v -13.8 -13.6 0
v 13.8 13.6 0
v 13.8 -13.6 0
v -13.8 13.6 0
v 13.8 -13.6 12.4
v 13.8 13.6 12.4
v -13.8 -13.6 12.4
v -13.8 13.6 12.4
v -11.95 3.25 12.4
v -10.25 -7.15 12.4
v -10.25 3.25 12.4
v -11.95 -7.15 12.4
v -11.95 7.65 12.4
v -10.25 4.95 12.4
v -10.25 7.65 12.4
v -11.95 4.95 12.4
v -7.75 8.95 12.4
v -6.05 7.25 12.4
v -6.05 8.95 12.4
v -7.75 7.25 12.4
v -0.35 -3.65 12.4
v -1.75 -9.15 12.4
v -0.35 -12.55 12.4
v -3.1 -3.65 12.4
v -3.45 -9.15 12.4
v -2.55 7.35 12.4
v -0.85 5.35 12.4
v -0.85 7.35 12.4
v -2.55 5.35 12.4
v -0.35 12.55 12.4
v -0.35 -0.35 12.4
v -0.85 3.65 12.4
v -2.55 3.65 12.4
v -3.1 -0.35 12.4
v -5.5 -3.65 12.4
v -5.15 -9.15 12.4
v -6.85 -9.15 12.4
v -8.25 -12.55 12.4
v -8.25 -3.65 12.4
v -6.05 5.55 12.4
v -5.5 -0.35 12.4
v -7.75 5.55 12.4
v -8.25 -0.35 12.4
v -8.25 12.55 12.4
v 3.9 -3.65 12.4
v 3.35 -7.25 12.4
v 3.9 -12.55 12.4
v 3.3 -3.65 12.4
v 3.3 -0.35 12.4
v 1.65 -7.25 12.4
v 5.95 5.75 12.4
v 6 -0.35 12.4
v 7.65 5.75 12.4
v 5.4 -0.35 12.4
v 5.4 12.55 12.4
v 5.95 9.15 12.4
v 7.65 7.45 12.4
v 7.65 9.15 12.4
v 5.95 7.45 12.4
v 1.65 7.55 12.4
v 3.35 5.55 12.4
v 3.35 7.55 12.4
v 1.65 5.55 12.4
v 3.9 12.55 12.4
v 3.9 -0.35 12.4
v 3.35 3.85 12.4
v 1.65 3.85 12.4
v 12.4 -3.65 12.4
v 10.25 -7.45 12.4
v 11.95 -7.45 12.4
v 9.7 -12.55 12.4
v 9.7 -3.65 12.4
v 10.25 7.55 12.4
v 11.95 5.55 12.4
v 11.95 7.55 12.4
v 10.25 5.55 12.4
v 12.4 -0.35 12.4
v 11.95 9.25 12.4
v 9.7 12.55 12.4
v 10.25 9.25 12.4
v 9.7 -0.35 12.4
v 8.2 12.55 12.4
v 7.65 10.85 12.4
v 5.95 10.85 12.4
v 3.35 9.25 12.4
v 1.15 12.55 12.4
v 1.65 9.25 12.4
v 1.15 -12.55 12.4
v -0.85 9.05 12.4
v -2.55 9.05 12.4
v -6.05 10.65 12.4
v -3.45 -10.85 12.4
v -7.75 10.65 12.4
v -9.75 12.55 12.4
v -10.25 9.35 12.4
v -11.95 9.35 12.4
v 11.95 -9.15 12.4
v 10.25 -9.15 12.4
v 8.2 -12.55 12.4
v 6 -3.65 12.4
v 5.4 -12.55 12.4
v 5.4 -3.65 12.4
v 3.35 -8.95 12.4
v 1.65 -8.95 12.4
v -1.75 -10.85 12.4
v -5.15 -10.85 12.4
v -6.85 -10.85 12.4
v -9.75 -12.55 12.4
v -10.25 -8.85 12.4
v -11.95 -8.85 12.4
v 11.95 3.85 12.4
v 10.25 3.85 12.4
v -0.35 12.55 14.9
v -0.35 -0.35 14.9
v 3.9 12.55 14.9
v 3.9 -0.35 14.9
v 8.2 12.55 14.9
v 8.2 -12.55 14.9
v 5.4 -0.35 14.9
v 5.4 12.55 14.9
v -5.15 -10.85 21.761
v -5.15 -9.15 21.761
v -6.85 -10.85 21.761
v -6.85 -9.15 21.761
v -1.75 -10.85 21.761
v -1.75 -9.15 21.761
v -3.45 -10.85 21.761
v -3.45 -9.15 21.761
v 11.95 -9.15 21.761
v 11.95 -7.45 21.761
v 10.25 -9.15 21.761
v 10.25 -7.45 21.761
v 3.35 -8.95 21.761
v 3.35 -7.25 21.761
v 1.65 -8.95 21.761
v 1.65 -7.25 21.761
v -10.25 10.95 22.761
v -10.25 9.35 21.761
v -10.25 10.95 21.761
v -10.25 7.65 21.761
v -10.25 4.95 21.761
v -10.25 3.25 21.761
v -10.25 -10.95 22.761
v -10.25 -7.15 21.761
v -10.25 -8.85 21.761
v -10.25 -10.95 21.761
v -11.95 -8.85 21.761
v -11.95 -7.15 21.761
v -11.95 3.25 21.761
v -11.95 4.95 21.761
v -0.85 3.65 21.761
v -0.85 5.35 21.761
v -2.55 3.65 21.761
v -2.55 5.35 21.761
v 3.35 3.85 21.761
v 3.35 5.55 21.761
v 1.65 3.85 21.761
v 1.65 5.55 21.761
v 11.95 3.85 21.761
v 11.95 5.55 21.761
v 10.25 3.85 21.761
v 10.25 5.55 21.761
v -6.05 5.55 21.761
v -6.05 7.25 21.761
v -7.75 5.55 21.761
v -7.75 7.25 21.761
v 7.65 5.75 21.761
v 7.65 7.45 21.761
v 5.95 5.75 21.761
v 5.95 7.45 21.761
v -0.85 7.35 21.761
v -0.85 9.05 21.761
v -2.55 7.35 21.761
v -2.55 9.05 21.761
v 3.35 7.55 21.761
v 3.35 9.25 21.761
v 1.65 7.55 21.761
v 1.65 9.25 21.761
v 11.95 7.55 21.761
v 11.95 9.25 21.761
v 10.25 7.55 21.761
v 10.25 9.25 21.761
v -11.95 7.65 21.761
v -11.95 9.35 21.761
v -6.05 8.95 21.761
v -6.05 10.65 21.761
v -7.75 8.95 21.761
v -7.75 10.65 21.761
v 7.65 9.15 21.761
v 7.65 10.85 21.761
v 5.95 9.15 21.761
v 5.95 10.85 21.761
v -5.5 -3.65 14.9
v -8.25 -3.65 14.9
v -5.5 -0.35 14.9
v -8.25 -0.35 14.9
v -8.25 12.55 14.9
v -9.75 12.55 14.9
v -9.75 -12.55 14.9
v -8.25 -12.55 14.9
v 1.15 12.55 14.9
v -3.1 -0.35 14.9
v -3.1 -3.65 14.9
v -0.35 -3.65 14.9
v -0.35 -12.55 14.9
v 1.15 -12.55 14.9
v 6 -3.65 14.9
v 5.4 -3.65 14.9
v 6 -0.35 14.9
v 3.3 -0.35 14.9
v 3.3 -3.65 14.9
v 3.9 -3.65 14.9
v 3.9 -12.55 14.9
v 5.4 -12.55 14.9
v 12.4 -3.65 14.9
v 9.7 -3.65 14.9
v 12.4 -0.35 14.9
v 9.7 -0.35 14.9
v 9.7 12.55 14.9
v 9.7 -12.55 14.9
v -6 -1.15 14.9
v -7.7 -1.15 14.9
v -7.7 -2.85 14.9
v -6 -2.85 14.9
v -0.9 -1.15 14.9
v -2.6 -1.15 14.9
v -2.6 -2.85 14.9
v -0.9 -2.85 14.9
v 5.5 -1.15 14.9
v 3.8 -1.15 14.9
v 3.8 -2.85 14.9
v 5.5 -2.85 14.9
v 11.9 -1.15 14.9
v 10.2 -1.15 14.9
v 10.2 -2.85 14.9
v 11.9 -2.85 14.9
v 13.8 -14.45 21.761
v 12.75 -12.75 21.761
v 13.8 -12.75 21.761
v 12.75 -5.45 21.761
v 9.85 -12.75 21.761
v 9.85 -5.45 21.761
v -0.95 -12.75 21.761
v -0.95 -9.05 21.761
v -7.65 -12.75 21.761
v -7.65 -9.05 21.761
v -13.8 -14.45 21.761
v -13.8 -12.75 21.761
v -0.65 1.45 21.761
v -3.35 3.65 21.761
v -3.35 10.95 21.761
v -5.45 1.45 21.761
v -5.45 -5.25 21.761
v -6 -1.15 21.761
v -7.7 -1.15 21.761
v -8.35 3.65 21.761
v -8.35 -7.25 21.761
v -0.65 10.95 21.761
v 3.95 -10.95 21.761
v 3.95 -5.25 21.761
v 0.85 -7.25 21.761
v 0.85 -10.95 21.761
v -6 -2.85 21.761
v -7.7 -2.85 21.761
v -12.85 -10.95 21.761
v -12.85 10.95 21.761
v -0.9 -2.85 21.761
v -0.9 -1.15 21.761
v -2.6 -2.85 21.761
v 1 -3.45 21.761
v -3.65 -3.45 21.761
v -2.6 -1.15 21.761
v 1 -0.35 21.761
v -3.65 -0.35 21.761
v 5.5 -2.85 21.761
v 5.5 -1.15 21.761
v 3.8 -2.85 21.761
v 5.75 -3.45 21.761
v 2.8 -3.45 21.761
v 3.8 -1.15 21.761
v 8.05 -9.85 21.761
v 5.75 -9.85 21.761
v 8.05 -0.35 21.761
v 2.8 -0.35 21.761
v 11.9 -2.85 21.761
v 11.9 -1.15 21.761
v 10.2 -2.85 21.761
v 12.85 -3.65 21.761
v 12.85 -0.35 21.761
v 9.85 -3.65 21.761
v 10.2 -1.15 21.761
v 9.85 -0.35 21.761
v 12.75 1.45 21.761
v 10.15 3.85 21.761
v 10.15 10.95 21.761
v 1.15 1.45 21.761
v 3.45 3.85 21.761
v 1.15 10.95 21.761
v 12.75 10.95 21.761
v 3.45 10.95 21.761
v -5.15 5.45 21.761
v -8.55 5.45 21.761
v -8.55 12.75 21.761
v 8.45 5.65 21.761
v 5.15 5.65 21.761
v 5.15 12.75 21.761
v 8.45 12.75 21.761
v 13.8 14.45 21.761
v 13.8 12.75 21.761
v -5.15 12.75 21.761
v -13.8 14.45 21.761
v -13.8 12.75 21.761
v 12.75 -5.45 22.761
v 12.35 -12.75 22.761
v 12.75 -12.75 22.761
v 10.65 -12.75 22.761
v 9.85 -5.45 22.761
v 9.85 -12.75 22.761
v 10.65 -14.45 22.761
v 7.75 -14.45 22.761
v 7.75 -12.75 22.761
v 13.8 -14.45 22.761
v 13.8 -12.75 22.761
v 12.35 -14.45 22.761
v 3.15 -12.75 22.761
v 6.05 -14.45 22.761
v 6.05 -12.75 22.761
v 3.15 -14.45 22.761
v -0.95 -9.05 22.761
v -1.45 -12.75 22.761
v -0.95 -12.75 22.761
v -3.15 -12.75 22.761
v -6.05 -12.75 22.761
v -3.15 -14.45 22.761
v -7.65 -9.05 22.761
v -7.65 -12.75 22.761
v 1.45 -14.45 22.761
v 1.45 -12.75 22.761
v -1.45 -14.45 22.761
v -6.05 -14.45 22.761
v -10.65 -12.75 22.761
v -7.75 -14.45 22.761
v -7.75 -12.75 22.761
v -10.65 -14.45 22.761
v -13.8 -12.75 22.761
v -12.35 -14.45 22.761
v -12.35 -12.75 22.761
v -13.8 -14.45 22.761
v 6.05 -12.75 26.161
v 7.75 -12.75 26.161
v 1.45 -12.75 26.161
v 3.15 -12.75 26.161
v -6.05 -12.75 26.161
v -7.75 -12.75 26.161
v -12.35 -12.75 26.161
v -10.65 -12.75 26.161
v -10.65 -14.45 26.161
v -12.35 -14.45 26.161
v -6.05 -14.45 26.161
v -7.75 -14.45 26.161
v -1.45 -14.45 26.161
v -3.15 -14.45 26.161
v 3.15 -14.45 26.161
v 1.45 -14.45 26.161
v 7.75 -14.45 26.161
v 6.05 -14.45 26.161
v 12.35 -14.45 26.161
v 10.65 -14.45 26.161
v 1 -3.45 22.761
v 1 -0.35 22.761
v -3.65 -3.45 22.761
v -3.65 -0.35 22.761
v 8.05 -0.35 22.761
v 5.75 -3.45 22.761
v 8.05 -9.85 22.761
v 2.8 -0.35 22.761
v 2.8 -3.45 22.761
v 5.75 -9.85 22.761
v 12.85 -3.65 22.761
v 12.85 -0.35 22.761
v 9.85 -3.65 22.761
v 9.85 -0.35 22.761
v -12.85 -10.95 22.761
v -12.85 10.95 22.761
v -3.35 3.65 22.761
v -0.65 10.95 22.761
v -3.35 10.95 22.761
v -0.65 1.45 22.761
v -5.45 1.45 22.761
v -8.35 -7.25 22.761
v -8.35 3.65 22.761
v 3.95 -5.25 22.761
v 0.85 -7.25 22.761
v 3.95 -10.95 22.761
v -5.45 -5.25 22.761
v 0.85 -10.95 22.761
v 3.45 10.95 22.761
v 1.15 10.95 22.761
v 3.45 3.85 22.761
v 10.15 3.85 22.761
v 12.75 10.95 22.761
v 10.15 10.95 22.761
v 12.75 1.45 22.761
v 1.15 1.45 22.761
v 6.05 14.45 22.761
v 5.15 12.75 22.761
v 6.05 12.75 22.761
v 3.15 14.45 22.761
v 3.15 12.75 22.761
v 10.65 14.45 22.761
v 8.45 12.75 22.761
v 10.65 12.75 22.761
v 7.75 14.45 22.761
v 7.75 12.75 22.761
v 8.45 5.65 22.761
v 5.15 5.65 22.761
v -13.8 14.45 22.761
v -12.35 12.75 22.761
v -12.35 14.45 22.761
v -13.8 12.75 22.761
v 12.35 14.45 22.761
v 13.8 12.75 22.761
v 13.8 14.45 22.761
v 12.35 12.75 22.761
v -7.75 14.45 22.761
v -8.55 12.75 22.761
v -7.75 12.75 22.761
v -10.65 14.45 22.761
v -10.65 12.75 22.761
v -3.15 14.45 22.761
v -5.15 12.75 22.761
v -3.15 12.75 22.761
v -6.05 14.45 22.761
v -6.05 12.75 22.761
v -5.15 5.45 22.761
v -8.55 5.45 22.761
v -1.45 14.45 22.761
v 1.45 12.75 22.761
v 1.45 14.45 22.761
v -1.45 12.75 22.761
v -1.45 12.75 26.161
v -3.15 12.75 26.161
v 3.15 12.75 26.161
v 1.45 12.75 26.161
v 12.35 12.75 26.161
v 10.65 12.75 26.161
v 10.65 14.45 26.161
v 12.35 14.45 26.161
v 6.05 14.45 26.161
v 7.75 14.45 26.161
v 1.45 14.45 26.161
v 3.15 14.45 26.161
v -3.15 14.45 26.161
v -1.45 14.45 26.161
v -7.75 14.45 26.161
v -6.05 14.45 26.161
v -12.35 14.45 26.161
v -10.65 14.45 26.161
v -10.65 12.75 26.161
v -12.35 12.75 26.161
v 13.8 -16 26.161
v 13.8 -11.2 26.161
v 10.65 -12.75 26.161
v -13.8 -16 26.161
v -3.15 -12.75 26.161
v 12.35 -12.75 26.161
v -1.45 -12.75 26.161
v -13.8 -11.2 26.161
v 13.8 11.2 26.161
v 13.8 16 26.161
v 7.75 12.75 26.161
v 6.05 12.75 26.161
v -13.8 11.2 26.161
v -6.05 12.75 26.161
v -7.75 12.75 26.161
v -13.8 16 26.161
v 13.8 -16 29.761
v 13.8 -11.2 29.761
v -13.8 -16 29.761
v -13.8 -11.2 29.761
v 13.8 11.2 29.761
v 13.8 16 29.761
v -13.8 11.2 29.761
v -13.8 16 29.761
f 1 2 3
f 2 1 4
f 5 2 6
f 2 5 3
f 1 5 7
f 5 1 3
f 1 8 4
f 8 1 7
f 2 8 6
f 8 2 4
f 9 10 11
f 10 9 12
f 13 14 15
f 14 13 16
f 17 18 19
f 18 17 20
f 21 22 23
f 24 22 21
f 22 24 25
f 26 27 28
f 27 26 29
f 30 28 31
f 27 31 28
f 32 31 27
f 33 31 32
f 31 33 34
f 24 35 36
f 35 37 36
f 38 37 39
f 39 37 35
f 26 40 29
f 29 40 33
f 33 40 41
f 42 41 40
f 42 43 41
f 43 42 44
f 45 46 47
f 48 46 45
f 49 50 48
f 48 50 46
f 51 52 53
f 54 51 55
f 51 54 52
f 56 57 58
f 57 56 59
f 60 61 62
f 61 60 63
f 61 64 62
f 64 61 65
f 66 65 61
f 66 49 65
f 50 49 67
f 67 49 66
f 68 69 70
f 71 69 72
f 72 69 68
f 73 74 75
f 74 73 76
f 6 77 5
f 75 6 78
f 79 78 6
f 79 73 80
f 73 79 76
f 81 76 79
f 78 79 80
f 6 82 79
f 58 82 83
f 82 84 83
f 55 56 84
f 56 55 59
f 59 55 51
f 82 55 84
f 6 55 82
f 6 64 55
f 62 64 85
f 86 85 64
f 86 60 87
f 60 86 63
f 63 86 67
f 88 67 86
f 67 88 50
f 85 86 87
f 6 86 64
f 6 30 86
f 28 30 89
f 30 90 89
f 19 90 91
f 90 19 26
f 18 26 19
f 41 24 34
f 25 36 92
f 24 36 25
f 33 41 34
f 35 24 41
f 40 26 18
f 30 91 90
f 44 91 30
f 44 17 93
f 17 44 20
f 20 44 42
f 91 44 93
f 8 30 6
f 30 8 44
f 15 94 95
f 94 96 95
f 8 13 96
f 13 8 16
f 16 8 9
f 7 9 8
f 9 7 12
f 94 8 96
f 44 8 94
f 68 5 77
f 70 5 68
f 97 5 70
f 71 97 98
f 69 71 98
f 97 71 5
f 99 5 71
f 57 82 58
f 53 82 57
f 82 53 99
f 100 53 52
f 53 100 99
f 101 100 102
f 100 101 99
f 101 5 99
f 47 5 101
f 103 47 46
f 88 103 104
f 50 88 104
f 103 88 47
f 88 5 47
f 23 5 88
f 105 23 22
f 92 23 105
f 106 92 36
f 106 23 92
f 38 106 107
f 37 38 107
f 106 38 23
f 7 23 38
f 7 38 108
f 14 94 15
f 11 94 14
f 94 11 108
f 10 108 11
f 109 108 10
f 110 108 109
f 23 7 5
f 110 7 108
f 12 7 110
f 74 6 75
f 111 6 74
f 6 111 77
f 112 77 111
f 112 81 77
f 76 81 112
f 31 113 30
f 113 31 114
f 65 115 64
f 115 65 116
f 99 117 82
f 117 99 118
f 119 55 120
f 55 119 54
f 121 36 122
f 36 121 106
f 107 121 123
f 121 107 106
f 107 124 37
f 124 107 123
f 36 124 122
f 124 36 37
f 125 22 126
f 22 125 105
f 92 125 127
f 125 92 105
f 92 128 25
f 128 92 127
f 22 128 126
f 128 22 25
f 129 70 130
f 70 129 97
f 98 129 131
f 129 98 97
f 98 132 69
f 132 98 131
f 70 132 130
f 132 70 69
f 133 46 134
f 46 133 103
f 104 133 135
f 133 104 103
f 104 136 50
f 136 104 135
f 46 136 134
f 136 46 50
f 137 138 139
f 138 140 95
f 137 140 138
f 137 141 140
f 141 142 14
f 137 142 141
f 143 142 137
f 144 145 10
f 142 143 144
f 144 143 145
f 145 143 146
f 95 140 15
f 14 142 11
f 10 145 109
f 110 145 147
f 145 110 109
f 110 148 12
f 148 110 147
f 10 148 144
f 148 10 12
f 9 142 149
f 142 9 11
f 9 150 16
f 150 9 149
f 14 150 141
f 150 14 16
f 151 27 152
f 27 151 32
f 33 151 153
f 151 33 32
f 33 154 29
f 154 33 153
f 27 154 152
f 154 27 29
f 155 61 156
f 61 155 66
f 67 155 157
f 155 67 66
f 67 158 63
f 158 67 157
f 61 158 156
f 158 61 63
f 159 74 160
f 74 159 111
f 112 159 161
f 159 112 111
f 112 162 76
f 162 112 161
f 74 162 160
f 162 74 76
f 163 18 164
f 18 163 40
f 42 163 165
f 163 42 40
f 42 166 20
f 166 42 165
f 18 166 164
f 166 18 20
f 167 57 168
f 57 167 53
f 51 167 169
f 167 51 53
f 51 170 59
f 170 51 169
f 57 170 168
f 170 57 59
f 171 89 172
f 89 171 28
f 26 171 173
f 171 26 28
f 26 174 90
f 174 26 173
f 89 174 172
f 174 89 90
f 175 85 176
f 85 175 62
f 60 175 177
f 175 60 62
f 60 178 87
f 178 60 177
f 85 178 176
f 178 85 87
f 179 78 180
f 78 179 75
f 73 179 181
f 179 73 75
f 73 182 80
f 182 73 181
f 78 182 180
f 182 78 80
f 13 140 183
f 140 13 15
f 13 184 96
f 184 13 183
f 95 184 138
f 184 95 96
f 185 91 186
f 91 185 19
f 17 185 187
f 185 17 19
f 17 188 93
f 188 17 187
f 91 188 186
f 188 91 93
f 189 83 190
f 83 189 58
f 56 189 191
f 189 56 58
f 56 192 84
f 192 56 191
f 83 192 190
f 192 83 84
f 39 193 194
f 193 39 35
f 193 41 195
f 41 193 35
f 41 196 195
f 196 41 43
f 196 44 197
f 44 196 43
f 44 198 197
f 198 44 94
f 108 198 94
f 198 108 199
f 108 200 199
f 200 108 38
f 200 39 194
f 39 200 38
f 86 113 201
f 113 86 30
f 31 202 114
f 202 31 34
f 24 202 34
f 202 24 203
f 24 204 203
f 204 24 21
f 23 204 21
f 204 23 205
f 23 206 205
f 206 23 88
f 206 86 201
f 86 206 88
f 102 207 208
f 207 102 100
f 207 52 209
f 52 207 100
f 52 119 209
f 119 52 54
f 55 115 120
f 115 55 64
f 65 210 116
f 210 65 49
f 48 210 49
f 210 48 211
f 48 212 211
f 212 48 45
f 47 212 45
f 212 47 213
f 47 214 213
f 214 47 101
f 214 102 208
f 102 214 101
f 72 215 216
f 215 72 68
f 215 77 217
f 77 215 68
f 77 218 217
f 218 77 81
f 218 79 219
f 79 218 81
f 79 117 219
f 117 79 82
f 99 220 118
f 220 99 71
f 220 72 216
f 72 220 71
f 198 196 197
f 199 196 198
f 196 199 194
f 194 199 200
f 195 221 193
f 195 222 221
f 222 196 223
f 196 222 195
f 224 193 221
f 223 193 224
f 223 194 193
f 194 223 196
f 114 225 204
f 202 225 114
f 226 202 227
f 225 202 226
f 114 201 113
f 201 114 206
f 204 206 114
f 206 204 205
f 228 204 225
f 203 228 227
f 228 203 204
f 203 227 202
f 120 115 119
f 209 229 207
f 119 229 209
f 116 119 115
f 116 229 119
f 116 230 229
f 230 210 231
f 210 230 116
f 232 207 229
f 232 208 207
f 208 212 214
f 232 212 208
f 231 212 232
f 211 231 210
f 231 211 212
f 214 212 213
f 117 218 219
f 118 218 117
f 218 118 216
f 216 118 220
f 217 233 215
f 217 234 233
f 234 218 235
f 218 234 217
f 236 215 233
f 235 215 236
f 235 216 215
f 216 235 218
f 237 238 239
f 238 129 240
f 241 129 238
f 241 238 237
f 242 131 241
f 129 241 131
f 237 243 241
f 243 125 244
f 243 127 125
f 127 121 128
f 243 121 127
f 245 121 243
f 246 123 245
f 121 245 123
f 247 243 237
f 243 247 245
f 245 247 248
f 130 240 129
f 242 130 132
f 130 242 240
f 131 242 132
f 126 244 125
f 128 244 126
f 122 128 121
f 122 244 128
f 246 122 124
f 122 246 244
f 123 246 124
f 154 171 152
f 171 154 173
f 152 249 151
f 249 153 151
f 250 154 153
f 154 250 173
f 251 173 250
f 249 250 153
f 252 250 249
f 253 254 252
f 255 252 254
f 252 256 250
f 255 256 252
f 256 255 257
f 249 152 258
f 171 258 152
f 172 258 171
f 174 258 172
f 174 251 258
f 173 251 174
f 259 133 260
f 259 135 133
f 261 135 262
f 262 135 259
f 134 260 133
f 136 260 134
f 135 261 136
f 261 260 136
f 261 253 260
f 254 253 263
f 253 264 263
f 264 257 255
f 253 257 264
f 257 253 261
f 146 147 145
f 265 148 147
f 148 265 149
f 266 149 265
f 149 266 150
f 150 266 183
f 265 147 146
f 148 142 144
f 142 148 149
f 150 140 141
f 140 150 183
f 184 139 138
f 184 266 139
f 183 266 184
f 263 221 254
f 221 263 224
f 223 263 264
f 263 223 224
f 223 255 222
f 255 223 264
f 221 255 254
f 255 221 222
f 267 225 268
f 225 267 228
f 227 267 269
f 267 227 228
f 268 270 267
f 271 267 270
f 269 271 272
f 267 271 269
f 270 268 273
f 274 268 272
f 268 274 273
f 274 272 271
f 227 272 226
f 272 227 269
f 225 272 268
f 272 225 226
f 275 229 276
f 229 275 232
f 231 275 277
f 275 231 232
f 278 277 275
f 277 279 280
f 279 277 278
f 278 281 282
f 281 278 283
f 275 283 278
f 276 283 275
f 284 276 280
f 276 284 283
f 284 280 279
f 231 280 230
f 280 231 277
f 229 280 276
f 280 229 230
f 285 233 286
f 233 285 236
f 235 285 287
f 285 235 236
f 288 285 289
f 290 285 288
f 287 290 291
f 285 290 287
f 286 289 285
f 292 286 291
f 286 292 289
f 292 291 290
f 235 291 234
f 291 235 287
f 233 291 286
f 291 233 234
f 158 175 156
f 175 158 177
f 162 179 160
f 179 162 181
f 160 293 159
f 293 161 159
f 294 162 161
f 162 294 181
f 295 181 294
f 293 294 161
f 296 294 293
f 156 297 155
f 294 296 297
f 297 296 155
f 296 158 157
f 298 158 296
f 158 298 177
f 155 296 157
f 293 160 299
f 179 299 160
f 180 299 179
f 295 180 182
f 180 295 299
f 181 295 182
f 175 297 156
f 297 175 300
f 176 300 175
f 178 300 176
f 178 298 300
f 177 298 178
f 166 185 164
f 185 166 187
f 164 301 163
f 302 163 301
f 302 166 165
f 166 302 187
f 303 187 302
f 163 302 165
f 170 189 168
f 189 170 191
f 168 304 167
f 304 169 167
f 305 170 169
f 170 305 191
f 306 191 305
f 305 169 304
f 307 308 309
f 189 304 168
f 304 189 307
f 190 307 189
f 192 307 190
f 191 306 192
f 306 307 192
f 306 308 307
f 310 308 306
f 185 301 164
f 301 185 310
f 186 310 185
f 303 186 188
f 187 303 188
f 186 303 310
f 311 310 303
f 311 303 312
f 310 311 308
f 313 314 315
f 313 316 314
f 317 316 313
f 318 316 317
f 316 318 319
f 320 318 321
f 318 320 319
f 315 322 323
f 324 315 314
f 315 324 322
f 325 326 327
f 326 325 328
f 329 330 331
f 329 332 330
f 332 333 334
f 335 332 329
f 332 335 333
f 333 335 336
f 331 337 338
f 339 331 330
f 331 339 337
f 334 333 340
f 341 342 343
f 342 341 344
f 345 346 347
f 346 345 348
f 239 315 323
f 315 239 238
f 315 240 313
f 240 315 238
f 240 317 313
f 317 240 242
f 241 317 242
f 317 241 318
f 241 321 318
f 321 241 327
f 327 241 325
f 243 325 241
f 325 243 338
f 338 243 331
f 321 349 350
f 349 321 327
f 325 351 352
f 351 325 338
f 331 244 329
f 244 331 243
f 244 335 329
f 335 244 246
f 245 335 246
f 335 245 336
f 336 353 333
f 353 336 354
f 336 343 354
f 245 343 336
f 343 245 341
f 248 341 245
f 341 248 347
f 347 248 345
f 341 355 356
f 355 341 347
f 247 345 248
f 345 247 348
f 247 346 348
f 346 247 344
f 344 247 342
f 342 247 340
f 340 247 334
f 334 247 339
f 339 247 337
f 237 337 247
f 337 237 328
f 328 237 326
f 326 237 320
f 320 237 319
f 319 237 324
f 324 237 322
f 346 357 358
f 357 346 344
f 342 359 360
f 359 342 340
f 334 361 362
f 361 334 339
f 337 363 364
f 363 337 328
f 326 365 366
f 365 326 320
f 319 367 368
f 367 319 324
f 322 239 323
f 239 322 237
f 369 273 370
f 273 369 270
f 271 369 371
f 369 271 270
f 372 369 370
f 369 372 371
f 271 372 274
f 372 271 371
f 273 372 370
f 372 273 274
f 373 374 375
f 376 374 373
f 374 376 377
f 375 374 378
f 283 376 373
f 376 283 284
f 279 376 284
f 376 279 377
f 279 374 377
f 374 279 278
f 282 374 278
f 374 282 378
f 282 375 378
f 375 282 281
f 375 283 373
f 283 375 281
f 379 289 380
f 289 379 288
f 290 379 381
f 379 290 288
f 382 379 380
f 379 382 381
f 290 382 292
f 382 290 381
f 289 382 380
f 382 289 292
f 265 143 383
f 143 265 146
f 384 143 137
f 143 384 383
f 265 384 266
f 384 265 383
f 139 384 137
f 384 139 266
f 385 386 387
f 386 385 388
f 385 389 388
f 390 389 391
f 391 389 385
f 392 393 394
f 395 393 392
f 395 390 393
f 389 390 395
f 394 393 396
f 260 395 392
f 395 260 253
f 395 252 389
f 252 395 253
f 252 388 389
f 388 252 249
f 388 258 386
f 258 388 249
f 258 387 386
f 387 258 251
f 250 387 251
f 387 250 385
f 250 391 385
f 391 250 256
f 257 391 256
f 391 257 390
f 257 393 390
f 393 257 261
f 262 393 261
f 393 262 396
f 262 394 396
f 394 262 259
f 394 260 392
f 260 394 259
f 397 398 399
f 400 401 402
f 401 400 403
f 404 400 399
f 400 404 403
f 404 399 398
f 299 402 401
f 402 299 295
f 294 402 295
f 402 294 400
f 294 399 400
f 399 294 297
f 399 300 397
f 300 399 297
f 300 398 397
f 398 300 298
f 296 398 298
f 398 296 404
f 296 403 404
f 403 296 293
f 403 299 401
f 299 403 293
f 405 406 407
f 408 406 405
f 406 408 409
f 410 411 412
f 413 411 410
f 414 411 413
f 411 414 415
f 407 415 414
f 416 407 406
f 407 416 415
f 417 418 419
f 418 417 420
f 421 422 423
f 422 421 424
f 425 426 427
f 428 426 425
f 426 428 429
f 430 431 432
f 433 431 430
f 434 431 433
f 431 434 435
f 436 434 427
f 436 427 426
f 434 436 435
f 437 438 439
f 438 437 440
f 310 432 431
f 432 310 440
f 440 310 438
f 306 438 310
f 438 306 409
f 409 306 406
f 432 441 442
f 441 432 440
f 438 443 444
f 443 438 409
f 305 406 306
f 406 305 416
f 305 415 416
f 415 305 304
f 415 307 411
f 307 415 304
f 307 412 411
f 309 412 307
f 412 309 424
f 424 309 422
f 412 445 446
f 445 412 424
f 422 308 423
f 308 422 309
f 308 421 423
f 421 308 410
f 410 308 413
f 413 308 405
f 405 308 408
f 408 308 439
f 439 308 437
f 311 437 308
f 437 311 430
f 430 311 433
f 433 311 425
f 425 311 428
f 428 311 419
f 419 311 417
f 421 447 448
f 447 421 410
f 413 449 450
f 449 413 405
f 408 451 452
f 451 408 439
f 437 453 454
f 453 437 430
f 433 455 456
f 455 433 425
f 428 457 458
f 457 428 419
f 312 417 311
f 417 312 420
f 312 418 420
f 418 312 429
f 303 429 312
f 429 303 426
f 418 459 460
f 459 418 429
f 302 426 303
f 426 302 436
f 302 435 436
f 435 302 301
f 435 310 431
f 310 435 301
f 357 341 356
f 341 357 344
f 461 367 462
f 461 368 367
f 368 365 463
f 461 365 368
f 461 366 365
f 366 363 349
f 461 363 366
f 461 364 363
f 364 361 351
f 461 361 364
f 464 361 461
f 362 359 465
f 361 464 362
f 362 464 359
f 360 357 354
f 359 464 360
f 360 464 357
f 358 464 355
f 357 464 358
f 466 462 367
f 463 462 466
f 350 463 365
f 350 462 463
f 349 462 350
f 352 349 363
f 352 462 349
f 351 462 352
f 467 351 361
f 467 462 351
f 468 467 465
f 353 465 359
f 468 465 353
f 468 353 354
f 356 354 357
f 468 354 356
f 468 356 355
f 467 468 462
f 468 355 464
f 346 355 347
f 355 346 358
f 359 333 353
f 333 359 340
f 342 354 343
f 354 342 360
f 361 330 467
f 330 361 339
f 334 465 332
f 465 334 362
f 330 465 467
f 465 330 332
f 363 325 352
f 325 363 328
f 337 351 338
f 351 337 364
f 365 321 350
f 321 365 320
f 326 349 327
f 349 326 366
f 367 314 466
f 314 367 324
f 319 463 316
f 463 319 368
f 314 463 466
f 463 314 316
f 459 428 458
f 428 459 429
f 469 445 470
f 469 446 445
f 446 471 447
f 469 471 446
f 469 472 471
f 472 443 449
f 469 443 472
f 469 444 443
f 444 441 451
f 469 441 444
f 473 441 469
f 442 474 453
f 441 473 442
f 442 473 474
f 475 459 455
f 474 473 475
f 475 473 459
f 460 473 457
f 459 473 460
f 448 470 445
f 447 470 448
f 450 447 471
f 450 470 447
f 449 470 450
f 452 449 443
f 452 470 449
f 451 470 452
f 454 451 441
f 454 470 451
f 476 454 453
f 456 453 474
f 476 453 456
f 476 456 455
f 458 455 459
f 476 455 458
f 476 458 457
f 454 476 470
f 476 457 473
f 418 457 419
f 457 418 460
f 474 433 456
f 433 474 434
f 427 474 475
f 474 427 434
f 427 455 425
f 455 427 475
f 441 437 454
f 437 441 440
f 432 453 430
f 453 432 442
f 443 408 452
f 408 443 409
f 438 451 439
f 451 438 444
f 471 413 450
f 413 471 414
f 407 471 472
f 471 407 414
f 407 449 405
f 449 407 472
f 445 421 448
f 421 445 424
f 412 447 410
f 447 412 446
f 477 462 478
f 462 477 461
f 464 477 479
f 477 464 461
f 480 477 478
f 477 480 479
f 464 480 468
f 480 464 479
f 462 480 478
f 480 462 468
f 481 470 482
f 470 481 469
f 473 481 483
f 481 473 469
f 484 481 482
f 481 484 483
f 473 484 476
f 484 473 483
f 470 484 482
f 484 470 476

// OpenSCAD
// Generated by SolidPython 0.4.2 on 2020-09-29 23:19:44
//!OpenSCAD

scale(v = 0.0100000000) {
	translate(v = [-1380, -1360, 0]) {
		union() {
			color(c = [0.4000000000, 0.4000000000, 0.4000000000]) {
				translate(v = [0, 0, 0]) {
					linear_extrude(height = 1000.0000000000) {
						polygon(paths = [[0, 1, 2, 3]], points = [[0, 0], [0, 2720], [2760, 2720], [2760, 0]]);
					}
				}
			}
			color(c = [0.2000000000, 0.6000000000, 0.2000000000]) {
				translate(v = [0, 0, 1000.0000000000]) {
					linear_extrude(height = 120.0000000000) {
						polygon(paths = [[0, 1, 2, 3]], points = [[0, 1305], [0, 2720], [2760, 2720], [2760, 1305]]);
					}
				}
			}
			color(c = [0.4000000000, 0.4000000000, 0.4000000000]) {
				translate(v = [0, 0, 1000.0000000000]) {
					linear_extrude(height = 120.0000000000) {
						polygon(paths = [[0, 1, 2, 3]], points = [[0, 0], [0, 1305], [2760, 1305], [2760, 0]]);
					}
				}
			}
			color(c = [0.9000000000, 0.6000000000, 0.6000000000]) {
				translate(v = [0, 0, 1120.0000000000]) {
					linear_extrude(height = 120.0000000000) {
						polygon(paths = [[0, 1, 2, 3]], points = [[145, 1485], [145, 2485], [405, 2485], [405, 1485]]);
					}
				}
			}
			color(c = [0.9000000000, 0.6000000000, 0.6000000000]) {
				translate(v = [0, 0, 1120.0000000000]) {
					linear_extrude(height = 120.0000000000) {
						polygon(paths = [[0, 1, 2, 3]], points = [[555, 1485], [555, 2485], [815, 2485], [815, 1485]]);
					}
				}
			}
			color(c = [0.9000000000, 0.6000000000, 0.6000000000]) {
				translate(v = [0, 0, 1120.0000000000]) {
					linear_extrude(height = 120.0000000000) {
						polygon(paths = [[0, 1, 2, 3]], points = [[1085, 1485], [1085, 2485], [1345, 2485], [1345, 1485]]);
					}
				}
			}
			color(c = [0.9000000000, 0.6000000000, 0.6000000000]) {
				translate(v = [0, 0, 1120.0000000000]) {
					linear_extrude(height = 120.0000000000) {
						polygon(paths = [[0, 1, 2, 3]], points = [[1495, 1485], [1495, 2485], [1770, 2485], [1770, 1485]]);
					}
				}
			}
			color(c = [0.9000000000, 0.6000000000, 0.6000000000]) {
				translate(v = [0, 0, 1120.0000000000]) {
					linear_extrude(height = 120.0000000000) {
						polygon(paths = [[0, 1, 2, 3]], points = [[1920, 1485], [1920, 2485], [2200, 2485], [2200, 1485]]);
					}
				}
			}
			color(c = [0.9000000000, 0.6000000000, 0.6000000000]) {
				translate(v = [0, 0, 1120.0000000000]) {
					linear_extrude(height = 120.0000000000) {
						polygon(paths = [[0, 1, 2, 3]], points = [[2350, 1485], [2350, 2485], [2615, 2485], [2615, 1485]]);
					}
				}
			}
			color(c = [0.9000000000, 0.6000000000, 0.9000000000]) {
				translate(v = [0, 0, 1120.0000000000]) {
					linear_extrude(height = 120.0000000000) {
						polygon(paths = [[0, 1, 2, 3]], points = [[145, 235], [145, 885], [405, 885], [405, 235]]);
					}
				}
			}
			color(c = [0.9000000000, 0.6000000000, 0.9000000000]) {
				translate(v = [0, 0, 1120.0000000000]) {
					linear_extrude(height = 120.0000000000) {
						polygon(paths = [[0, 1, 2, 3]], points = [[555, 235], [555, 885], [1345, 885], [1345, 235]]);
					}
				}
			}
			color(c = [0.9000000000, 0.6000000000, 0.9000000000]) {
				translate(v = [0, 0, 1120.0000000000]) {
					linear_extrude(height = 120.0000000000) {
						polygon(paths = [[0, 1, 2, 3]], points = [[1495, 235], [1495, 885], [1770, 885], [1770, 235]]);
					}
				}
			}
			color(c = [0.9000000000, 0.6000000000, 0.9000000000]) {
				translate(v = [0, 0, 1120.0000000000]) {
					linear_extrude(height = 120.0000000000) {
						polygon(paths = [[0, 1, 2, 3]], points = [[1920, 235], [1920, 885], [2200, 885], [2200, 235]]);
					}
				}
			}
			color(c = [0.9000000000, 0.6000000000, 0.9000000000]) {
				translate(v = [0, 0, 1120.0000000000]) {
					linear_extrude(height = 120.0000000000) {
						polygon(paths = [[0, 1, 2, 3]], points = [[2350, 235], [2350, 885], [2615, 885], [2615, 235]]);
					}
				}
			}
			color(c = [0.2000000000, 0.6000000000, 0.2000000000]) {
				translate(v = [0, 0, 1120.0000000000]) {
					linear_extrude(height = 120.0000000000) {
						difference() {
							polygon(paths = [[0, 1, 2, 3]], points = [[0, 1305], [0, 2720], [2760, 2720], [2760, 1305]]);
							polygon(paths = [[0, 1, 2, 3]], points = [[145, 1485], [405, 1485], [405, 2485], [145, 2485]]);
							polygon(paths = [[0, 1, 2, 3]], points = [[555, 1485], [815, 1485], [815, 2485], [555, 2485]]);
							polygon(paths = [[0, 1, 2, 3]], points = [[1085, 1485], [1345, 1485], [1345, 2485], [1085, 2485]]);
							polygon(paths = [[0, 1, 2, 3]], points = [[1495, 1485], [1770, 1485], [1770, 2485], [1495, 2485]]);
							polygon(paths = [[0, 1, 2, 3]], points = [[1920, 1485], [2200, 1485], [2200, 2485], [1920, 2485]]);
							polygon(paths = [[0, 1, 2, 3]], points = [[2350, 1485], [2615, 1485], [2615, 2485], [2350, 2485]]);
						}
					}
				}
			}
			color(c = [0.4000000000, 0.4000000000, 0.4000000000]) {
				translate(v = [0, 0, 1120.0000000000]) {
					linear_extrude(height = 120.0000000000) {
						difference() {
							polygon(paths = [[0, 1, 2, 3]], points = [[0, 0], [0, 1305], [2760, 1305], [2760, 0]]);
							polygon(paths = [[0, 1, 2, 3]], points = [[145, 235], [405, 235], [405, 885], [145, 885]]);
							polygon(paths = [[0, 1, 2, 3]], points = [[555, 235], [1345, 235], [1345, 885], [555, 885]]);
							polygon(paths = [[0, 1, 2, 3]], points = [[1495, 235], [1770, 235], [1770, 885], [1495, 885]]);
							polygon(paths = [[0, 1, 2, 3]], points = [[1920, 235], [2200, 235], [2200, 885], [1920, 885]]);
							polygon(paths = [[0, 1, 2, 3]], points = [[2350, 235], [2615, 235], [2615, 885], [2350, 885]]);
						}
					}
				}
			}
			color(c = [0.1000000000, 0.1000000000, 0.1000000000]) {
				translate(v = [0, 0, 1240.0000000000]) {
					linear_extrude(height = 70.0000000000) {
						polygon(paths = [[0, 1, 2, 3]], points = [[695, 275], [695, 445], [865, 445], [865, 275]]);
					}
				}
			}
			color(c = [0.1000000000, 0.1000000000, 0.1000000000]) {
				translate(v = [0, 0, 1240.0000000000]) {
					linear_extrude(height = 70.0000000000) {
						polygon(paths = [[0, 1, 2, 3]], points = [[1035, 275], [1035, 445], [1205, 445], [1205, 275]]);
					}
				}
			}
			color(c = [0.1000000000, 0.1000000000, 0.1000000000]) {
				translate(v = [0, 0, 1240.0000000000]) {
					linear_extrude(height = 70.0000000000) {
						polygon(paths = [[0, 1, 2, 3]], points = [[2405, 445], [2405, 615], [2575, 615], [2575, 445]]);
					}
				}
			}
			color(c = [0.1000000000, 0.1000000000, 0.1000000000]) {
				translate(v = [0, 0, 1240.0000000000]) {
					linear_extrude(height = 70.0000000000) {
						polygon(paths = [[0, 1, 2, 3]], points = [[1545, 465], [1545, 635], [1715, 635], [1715, 465]]);
					}
				}
			}
			color(c = [0.1000000000, 0.1000000000, 0.1000000000]) {
				translate(v = [0, 0, 1240.0000000000]) {
					linear_extrude(height = 70.0000000000) {
						polygon(paths = [[0, 1, 2, 3]], points = [[185, 475], [185, 645], [355, 645], [355, 475]]);
					}
				}
			}
			color(c = [0.1000000000, 0.1000000000, 0.1000000000]) {
				translate(v = [0, 0, 1240.0000000000]) {
					linear_extrude(height = 70.0000000000) {
						polygon(paths = [[0, 1, 2, 3]], points = [[185, 1685], [185, 1855], [355, 1855], [355, 1685]]);
					}
				}
			}
			color(c = [0.1000000000, 0.1000000000, 0.1000000000]) {
				translate(v = [0, 0, 1240.0000000000]) {
					linear_extrude(height = 70.0000000000) {
						polygon(paths = [[0, 1, 2, 3]], points = [[1125, 1725], [1125, 1895], [1295, 1895], [1295, 1725]]);
					}
				}
			}
			color(c = [0.1000000000, 0.1000000000, 0.1000000000]) {
				translate(v = [0, 0, 1240.0000000000]) {
					linear_extrude(height = 70.0000000000) {
						polygon(paths = [[0, 1, 2, 3]], points = [[1545, 1745], [1545, 1915], [1715, 1915], [1715, 1745]]);
					}
				}
			}
			color(c = [0.1000000000, 0.1000000000, 0.1000000000]) {
				translate(v = [0, 0, 1240.0000000000]) {
					linear_extrude(height = 70.0000000000) {
						polygon(paths = [[0, 1, 2, 3]], points = [[2405, 1745], [2405, 1915], [2575, 1915], [2575, 1745]]);
					}
				}
			}
			color(c = [0.1000000000, 0.1000000000, 0.1000000000]) {
				translate(v = [0, 0, 1240.0000000000]) {
					linear_extrude(height = 70.0000000000) {
						polygon(paths = [[0, 1, 2, 3]], points = [[605, 1915], [605, 2085], [775, 2085], [775, 1915]]);
					}
				}
			}
			color(c = [0.1000000000, 0.1000000000, 0.1000000000]) {
				translate(v = [0, 0, 1240.0000000000]) {
					linear_extrude(height = 70.0000000000) {
						polygon(paths = [[0, 1, 2, 3]], points = [[1975, 1935], [1975, 2105], [2145, 2105], [2145, 1935]]);
					}
				}
			}
			color(c = [0.1000000000, 0.1000000000, 0.1000000000]) {
				translate(v = [0, 0, 1240.0000000000]) {
					linear_extrude(height = 70.0000000000) {
						polygon(paths = [[0, 1, 2, 3]], points = [[1125, 2095], [1125, 2265], [1295, 2265], [1295, 2095]]);
					}
				}
			}
			color(c = [0.1000000000, 0.1000000000, 0.1000000000]) {
				translate(v = [0, 0, 1240.0000000000]) {
					linear_extrude(height = 70.0000000000) {
						polygon(paths = [[0, 1, 2, 3]], points = [[1545, 2115], [1545, 2285], [1715, 2285], [1715, 2115]]);
					}
				}
			}
			color(c = [0.1000000000, 0.1000000000, 0.1000000000]) {
				translate(v = [0, 0, 1240.0000000000]) {
					linear_extrude(height = 70.0000000000) {
						polygon(paths = [[0, 1, 2, 3]], points = [[2405, 2115], [2405, 2285], [2575, 2285], [2575, 2115]]);
					}
				}
			}
			color(c = [0.1000000000, 0.1000000000, 0.1000000000]) {
				translate(v = [0, 0, 1240.0000000000]) {
					linear_extrude(height = 70.0000000000) {
						polygon(paths = [[0, 1, 2, 3]], points = [[185, 2125], [185, 2295], [355, 2295], [355, 2125]]);
					}
				}
			}
			color(c = [0.1000000000, 0.1000000000, 0.1000000000]) {
				translate(v = [0, 0, 1240.0000000000]) {
					linear_extrude(height = 70.0000000000) {
						polygon(paths = [[0, 1, 2, 3]], points = [[605, 2255], [605, 2425], [775, 2425], [775, 2255]]);
					}
				}
			}
			color(c = [0.1000000000, 0.1000000000, 0.1000000000]) {
				translate(v = [0, 0, 1240.0000000000]) {
					linear_extrude(height = 70.0000000000) {
						polygon(paths = [[0, 1, 2, 3]], points = [[1975, 2275], [1975, 2445], [2145, 2445], [2145, 2275]]);
					}
				}
			}
			color(c = [1.0000000000, 1.0000000000, 1.0000000000]) {
				translate(v = [0, 0, 1240.0000000000]) {
					linear_extrude(height = 70.0000000000) {
						polygon(paths = [[0, 1, 2, 3, 4, 5, 6, 7]], points = [[405, 105], [405, 2615], [555, 2615], [555, 1325], [830, 1325], [830, 995], [555, 995], [555, 105]]);
					}
				}
			}
			color(c = [1.0000000000, 1.0000000000, 1.0000000000]) {
				translate(v = [0, 0, 1240.0000000000]) {
					linear_extrude(height = 70.0000000000) {
						polygon(paths = [[0, 1, 2, 3, 4, 5, 6, 7]], points = [[1345, 105], [1345, 995], [1070, 995], [1070, 1325], [1345, 1325], [1345, 2615], [1495, 2615], [1495, 105]]);
					}
				}
			}
			color(c = [1.0000000000, 1.0000000000, 1.0000000000]) {
				translate(v = [0, 0, 1240.0000000000]) {
					linear_extrude(height = 70.0000000000) {
						polygon(paths = [[0, 1, 2, 3, 4, 5, 6, 7, 8, 9, 10, 11]], points = [[1770, 105], [1770, 995], [1710, 995], [1710, 1325], [1770, 1325], [1770, 2615], [1920, 2615], [1920, 1325], [1980, 1325], [1980, 995], [1920, 995], [1920, 105]]);
					}
				}
			}
			color(c = [1.0000000000, 1.0000000000, 1.0000000000]) {
				translate(v = [0, 0, 1240.0000000000]) {
					linear_extrude(height = 70.0000000000) {
						polygon(paths = [[0, 1, 2, 3, 4, 5, 6, 7]], points = [[2200, 105], [2200, 2615], [2350, 2615], [2350, 1325], [2620, 1325], [2620, 995], [2350, 995], [2350, 105]]);
					}
				}
			}
			color(c = [0.1000000000, 0.1000000000, 0.1000000000]) {
				translate(v = [0, 0, 1310.0000000000]) {
					linear_extrude(height = 180.0000000000) {
						polygon(paths = [[0, 1, 2, 3]], points = [[695, 275], [695, 445], [865, 445], [865, 275]]);
					}
				}
			}
			color(c = [0.1000000000, 0.1000000000, 0.1000000000]) {
				translate(v = [0, 0, 1310.0000000000]) {
					linear_extrude(height = 180.0000000000) {
						polygon(paths = [[0, 1, 2, 3]], points = [[1035, 275], [1035, 445], [1205, 445], [1205, 275]]);
					}
				}
			}
			color(c = [0.1000000000, 0.1000000000, 0.1000000000]) {
				translate(v = [0, 0, 1310.0000000000]) {
					linear_extrude(height = 180.0000000000) {
						polygon(paths = [[0, 1, 2, 3]], points = [[2405, 445], [2405, 615], [2575, 615], [2575, 445]]);
					}
				}
			}
			color(c = [0.1000000000, 0.1000000000, 0.1000000000]) {
				translate(v = [0, 0, 1310.0000000000]) {
					linear_extrude(height = 180.0000000000) {
						polygon(paths = [[0, 1, 2, 3]], points = [[1545, 465], [1545, 635], [1715, 635], [1715, 465]]);
					}
				}
			}
			color(c = [0.1000000000, 0.1000000000, 0.1000000000]) {
				translate(v = [0, 0, 1310.0000000000]) {
					linear_extrude(height = 180.0000000000) {
						polygon(paths = [[0, 1, 2, 3]], points = [[185, 475], [185, 645], [355, 645], [355, 475]]);
					}
				}
			}
			color(c = [0.1000000000, 0.1000000000, 0.1000000000]) {
				translate(v = [0, 0, 1310.0000000000]) {
					linear_extrude(height = 180.0000000000) {
						polygon(paths = [[0, 1, 2, 3]], points = [[185, 1685], [185, 1855], [355, 1855], [355, 1685]]);
					}
				}
			}
			color(c = [0.1000000000, 0.1000000000, 0.1000000000]) {
				translate(v = [0, 0, 1310.0000000000]) {
					linear_extrude(height = 180.0000000000) {
						polygon(paths = [[0, 1, 2, 3]], points = [[1125, 1725], [1125, 1895], [1295, 1895], [1295, 1725]]);
					}
				}
			}
			color(c = [0.1000000000, 0.1000000000, 0.1000000000]) {
				translate(v = [0, 0, 1310.0000000000]) {
					linear_extrude(height = 180.0000000000) {
						polygon(paths = [[0, 1, 2, 3]], points = [[1545, 1745], [1545, 1915], [1715, 1915], [1715, 1745]]);
					}
				}
			}
			color(c = [0.1000000000, 0.1000000000, 0.1000000000]) {
				translate(v = [0, 0, 1310.0000000000]) {
					linear_extrude(height = 180.0000000000) {
						polygon(paths = [[0, 1, 2, 3]], points = [[2405, 1745], [2405, 1915], [2575, 1915], [2575, 1745]]);
					}
				}
			}
			color(c = [0.1000000000, 0.1000000000, 0.1000000000]) {
				translate(v = [0, 0, 1310.0000000000]) {
					linear_extrude(height = 180.0000000000) {
						polygon(paths = [[0, 1, 2, 3]], points = [[605, 1915], [605, 2085], [775, 2085], [775, 1915]]);
					}
				}
			}
			color(c = [0.1000000000, 0.1000000000, 0.1000000000]) {
				translate(v = [0, 0, 1310.0000000000]) {
					linear_extrude(height = 180.0000000000) {
						polygon(paths = [[0, 1, 2, 3]], points = [[1975, 1935], [1975, 2105], [2145, 2105], [2145, 1935]]);
					}
				}
			}
			color(c = [0.1000000000, 0.1000000000, 0.1000000000]) {
				translate(v = [0, 0, 1310.0000000000]) {
					linear_extrude(height = 180.0000000000) {
						polygon(paths = [[0, 1, 2, 3]], points = [[1125, 2095], [1125, 2265], [1295, 2265], [1295, 2095]]);
					}
				}
			}
			color(c = [0.1000000000, 0.1000000000, 0.1000000000]) {
				translate(v = [0, 0, 1310.0000000000]) {
					linear_extrude(height = 180.0000000000) {
						polygon(paths = [[0, 1, 2, 3]], points = [[1545, 2115], [1545, 2285], [1715, 2285], [1715, 2115]]);
					}
				}
			}
			color(c = [0.1000000000, 0.1000000000, 0.1000000000]) {
				translate(v = [0, 0, 1310.0000000000]) {
					linear_extrude(height = 180.0000000000) {
						polygon(paths = [[0, 1, 2, 3]], points = [[2405, 2115], [2405, 2285], [2575, 2285], [2575, 2115]]);
					}
				}
			}
			color(c = [0.1000000000, 0.1000000000, 0.1000000000]) {
				translate(v = [0, 0, 1310.0000000000]) {
					linear_extrude(height = 180.0000000000) {
						polygon(paths = [[0, 1, 2, 3]], points = [[185, 2125], [185, 2295], [355, 2295], [355, 2125]]);
					}
				}
			}
			color(c = [0.1000000000, 0.1000000000, 0.1000000000]) {
				translate(v = [0, 0, 1310.0000000000]) {
					linear_extrude(height = 180.0000000000) {
						polygon(paths = [[0, 1, 2, 3]], points = [[605, 2255], [605, 2425], [775, 2425], [775, 2255]]);
					}
				}
			}
			color(c = [0.1000000000, 0.1000000000, 0.1000000000]) {
				translate(v = [0, 0, 1310.0000000000]) {
					linear_extrude(height = 180.0000000000) {
						polygon(paths = [[0, 1, 2, 3]], points = [[1975, 2275], [1975, 2445], [2145, 2445], [2145, 2275]]);
					}
				}
			}
			color(c = [0.7000000000, 0, 0]) {
				translate(v = [0, 0, 1310.0000000000]) {
					linear_extrude(height = 180.0000000000) {
						polygon(paths = [[0, 1, 2, 3, 4, 5, 6, 7]], points = [[405, 105], [405, 2615], [555, 2615], [555, 1325], [830, 1325], [830, 995], [555, 995], [555, 105]]);
					}
				}
			}
			color(c = [0.7000000000, 0, 0]) {
				translate(v = [0, 0, 1310.0000000000]) {
					linear_extrude(height = 180.0000000000) {
						polygon(paths = [[0, 1, 2, 3, 4, 5, 6, 7]], points = [[1345, 105], [1345, 995], [1070, 995], [1070, 1325], [1345, 1325], [1345, 2615], [1495, 2615], [1495, 105]]);
					}
				}
			}
			color(c = [0.7000000000, 0, 0]) {
				translate(v = [0, 0, 1310.0000000000]) {
					linear_extrude(height = 180.0000000000) {
						polygon(paths = [[0, 1, 2, 3, 4, 5, 6, 7, 8, 9, 10, 11]], points = [[1770, 105], [1770, 995], [1710, 995], [1710, 1325], [1770, 1325], [1770, 2615], [1920, 2615], [1920, 1325], [1980, 1325], [1980, 995], [1920, 995], [1920, 105]]);
					}
				}
			}
			color(c = [0.7000000000, 0, 0]) {
				translate(v = [0, 0, 1310.0000000000]) {
					linear_extrude(height = 180.0000000000) {
						polygon(paths = [[0, 1, 2, 3, 4, 5, 6, 7]], points = [[2200, 105], [2200, 2615], [2350, 2615], [2350, 1325], [2620, 1325], [2620, 995], [2350, 995], [2350, 105]]);
					}
				}
			}
			color(c = [0.1000000000, 0.1000000000, 0.1000000000]) {
				translate(v = [0, 0, 1490.0000000000]) {
					linear_extrude(height = 686.1000000000) {
						polygon(paths = [[0, 1, 2, 3]], points = [[695, 275], [695, 445], [865, 445], [865, 275]]);
					}
				}
			}
			color(c = [0.1000000000, 0.1000000000, 0.1000000000]) {
				translate(v = [0, 0, 1490.0000000000]) {
					linear_extrude(height = 686.1000000000) {
						polygon(paths = [[0, 1, 2, 3]], points = [[1035, 275], [1035, 445], [1205, 445], [1205, 275]]);
					}
				}
			}
			color(c = [0.1000000000, 0.1000000000, 0.1000000000]) {
				translate(v = [0, 0, 1490.0000000000]) {
					linear_extrude(height = 686.1000000000) {
						polygon(paths = [[0, 1, 2, 3]], points = [[2405, 445], [2405, 615], [2575, 615], [2575, 445]]);
					}
				}
			}
			color(c = [0.1000000000, 0.1000000000, 0.1000000000]) {
				translate(v = [0, 0, 1490.0000000000]) {
					linear_extrude(height = 686.1000000000) {
						polygon(paths = [[0, 1, 2, 3]], points = [[1545, 465], [1545, 635], [1715, 635], [1715, 465]]);
					}
				}
			}
			color(c = [0.1000000000, 0.1000000000, 0.1000000000]) {
				translate(v = [0, 0, 1490.0000000000]) {
					linear_extrude(height = 686.1000000000) {
						polygon(paths = [[0, 1, 2, 3]], points = [[185, 475], [185, 645], [355, 645], [355, 475]]);
					}
				}
			}
			color(c = [0.1000000000, 0.1000000000, 0.1000000000]) {
				translate(v = [0, 0, 1490.0000000000]) {
					linear_extrude(height = 686.1000000000) {
						polygon(paths = [[0, 1, 2, 3]], points = [[610, 1075], [610, 1245], [780, 1245], [780, 1075]]);
					}
				}
			}
			color(c = [0.1000000000, 0.1000000000, 0.1000000000]) {
				translate(v = [0, 0, 1490.0000000000]) {
					linear_extrude(height = 686.1000000000) {
						polygon(paths = [[0, 1, 2, 3]], points = [[1120, 1075], [1120, 1245], [1290, 1245], [1290, 1075]]);
					}
				}
			}
			color(c = [0.1000000000, 0.1000000000, 0.1000000000]) {
				translate(v = [0, 0, 1490.0000000000]) {
					linear_extrude(height = 686.1000000000) {
						polygon(paths = [[0, 1, 2, 3]], points = [[1760, 1075], [1760, 1245], [1930, 1245], [1930, 1075]]);
					}
				}
			}
			color(c = [0.1000000000, 0.1000000000, 0.1000000000]) {
				translate(v = [0, 0, 1490.0000000000]) {
					linear_extrude(height = 686.1000000000) {
						polygon(paths = [[0, 1, 2, 3]], points = [[2400, 1075], [2400, 1245], [2570, 1245], [2570, 1075]]);
					}
				}
			}
			color(c = [0.1000000000, 0.1000000000, 0.1000000000]) {
				translate(v = [0, 0, 1490.0000000000]) {
					linear_extrude(height = 686.1000000000) {
						polygon(paths = [[0, 1, 2, 3]], points = [[185, 1685], [185, 1855], [355, 1855], [355, 1685]]);
					}
				}
			}
			color(c = [0.1000000000, 0.1000000000, 0.1000000000]) {
				translate(v = [0, 0, 1490.0000000000]) {
					linear_extrude(height = 686.1000000000) {
						polygon(paths = [[0, 1, 2, 3]], points = [[1125, 1725], [1125, 1895], [1295, 1895], [1295, 1725]]);
					}
				}
			}
			color(c = [0.1000000000, 0.1000000000, 0.1000000000]) {
				translate(v = [0, 0, 1490.0000000000]) {
					linear_extrude(height = 686.1000000000) {
						polygon(paths = [[0, 1, 2, 3]], points = [[1545, 1745], [1545, 1915], [1715, 1915], [1715, 1745]]);
					}
				}
			}
			color(c = [0.1000000000, 0.1000000000, 0.1000000000]) {
				translate(v = [0, 0, 1490.0000000000]) {
					linear_extrude(height = 686.1000000000) {
						polygon(paths = [[0, 1, 2, 3]], points = [[2405, 1745], [2405, 1915], [2575, 1915], [2575, 1745]]);
					}
				}
			}
			color(c = [0.1000000000, 0.1000000000, 0.1000000000]) {
				translate(v = [0, 0, 1490.0000000000]) {
					linear_extrude(height = 686.1000000000) {
						polygon(paths = [[0, 1, 2, 3]], points = [[605, 1915], [605, 2085], [775, 2085], [775, 1915]]);
					}
				}
			}
			color(c = [0.1000000000, 0.1000000000, 0.1000000000]) {
				translate(v = [0, 0, 1490.0000000000]) {
					linear_extrude(height = 686.1000000000) {
						polygon(paths = [[0, 1, 2, 3]], points = [[1975, 1935], [1975, 2105], [2145, 2105], [2145, 1935]]);
					}
				}
			}
			color(c = [0.1000000000, 0.1000000000, 0.1000000000]) {
				translate(v = [0, 0, 1490.0000000000]) {
					linear_extrude(height = 686.1000000000) {
						polygon(paths = [[0, 1, 2, 3]], points = [[1125, 2095], [1125, 2265], [1295, 2265], [1295, 2095]]);
					}
				}
			}
			color(c = [0.1000000000, 0.1000000000, 0.1000000000]) {
				translate(v = [0, 0, 1490.0000000000]) {
					linear_extrude(height = 686.1000000000) {
						polygon(paths = [[0, 1, 2, 3]], points = [[1545, 2115], [1545, 2285], [1715, 2285], [1715, 2115]]);
					}
				}
			}
			color(c = [0.1000000000, 0.1000000000, 0.1000000000]) {
				translate(v = [0, 0, 1490.0000000000]) {
					linear_extrude(height = 686.1000000000) {
						polygon(paths = [[0, 1, 2, 3]], points = [[2405, 2115], [2405, 2285], [2575, 2285], [2575, 2115]]);
					}
				}
			}
			color(c = [0.1000000000, 0.1000000000, 0.1000000000]) {
				translate(v = [0, 0, 1490.0000000000]) {
					linear_extrude(height = 686.1000000000) {
						polygon(paths = [[0, 1, 2, 3]], points = [[185, 2125], [185, 2295], [355, 2295], [355, 2125]]);
					}
				}
			}
			color(c = [0.1000000000, 0.1000000000, 0.1000000000]) {
				translate(v = [0, 0, 1490.0000000000]) {
					linear_extrude(height = 686.1000000000) {
						polygon(paths = [[0, 1, 2, 3]], points = [[605, 2255], [605, 2425], [775, 2425], [775, 2255]]);
					}
				}
			}
			color(c = [0.1000000000, 0.1000000000, 0.1000000000]) {
				translate(v = [0, 0, 1490.0000000000]) {
					linear_extrude(height = 686.1000000000) {
						polygon(paths = [[0, 1, 2, 3]], points = [[1975, 2275], [1975, 2445], [2145, 2445], [2145, 2275]]);
					}
				}
			}
			color(c = [0.9000000000, 0.6000000000, 0.6000000000]) {
				translate(v = [0, 0, 2176.1000000000]) {
					linear_extrude(height = 100.0000000000) {
						polygon(paths = [[0, 1, 2, 3, 4, 5, 6, 7, 8, 9, 10, 11]], points = [[0, -85], [0, 85], [615, 85], [615, 455], [1285, 455], [1285, 85], [2365, 85], [2365, 815], [2655, 815], [2655, 85], [2760, 85], [2760, -85]]);
					}
				}
			}
			color(c = [0.9000000000, 0.6000000000, 0.6000000000]) {
				translate(v = [0, 0, 2176.1000000000]) {
					linear_extrude(height = 100.0000000000) {
						polygon(paths = [[0, 1, 2, 3]], points = [[1015, 1015], [1015, 1325], [1480, 1325], [1480, 1015]]);
					}
				}
			}
			color(c = [0.9000000000, 0.6000000000, 0.6000000000]) {
				translate(v = [0, 0, 2176.1000000000]) {
					linear_extrude(height = 100.0000000000) {
						polygon(paths = [[0, 1, 2, 3, 4, 5]], points = [[1955, 375], [1955, 1015], [1660, 1015], [1660, 1325], [2185, 1325], [2185, 375]]);
					}
				}
			}
			color(c = [0.9000000000, 0.6000000000, 0.6000000000]) {
				translate(v = [0, 0, 2176.1000000000]) {
					linear_extrude(height = 100.0000000000) {
						polygon(paths = [[0, 1, 2, 3]], points = [[2365, 995], [2365, 1325], [2665, 1325], [2665, 995]]);
					}
				}
			}
			color(c = [0.9000000000, 0.6000000000, 0.6000000000]) {
				translate(v = [0, 0, 2176.1000000000]) {
					linear_extrude(height = 100.0000000000) {
						polygon(paths = [[0, 1, 2, 3]], points = [[95, 265], [95, 2455], [355, 2455], [355, 265]]);
					}
				}
			}
			color(c = [0.9000000000, 0.6000000000, 0.6000000000]) {
				translate(v = [0, 0, 2176.1000000000]) {
					linear_extrude(height = 100.0000000000) {
						polygon(paths = [[0, 1, 2, 3, 4, 5, 6, 7, 8, 9, 10, 11]], points = [[1465, 265], [1465, 635], [545, 635], [545, 1725], [1045, 1725], [1045, 2455], [1315, 2455], [1315, 1505], [835, 1505], [835, 835], [1775, 835], [1775, 265]]);
					}
				}
			}
			color(c = [0.9000000000, 0.6000000000, 0.6000000000]) {
				translate(v = [0, 0, 2176.1000000000]) {
					linear_extrude(height = 100.0000000000) {
						polygon(paths = [[0, 1, 2, 3, 4, 5, 6, 7]], points = [[1495, 1505], [1495, 2455], [1725, 2455], [1725, 1745], [2395, 1745], [2395, 2455], [2655, 2455], [2655, 1505]]);
					}
				}
			}
			color(c = [0.9000000000, 0.6000000000, 0.6000000000]) {
				translate(v = [0, 0, 2176.1000000000]) {
					linear_extrude(height = 100.0000000000) {
						polygon(paths = [[0, 1, 2, 3, 4, 5, 6, 7, 8, 9, 10, 11]], points = [[525, 1905], [525, 2635], [0, 2635], [0, 2805], [2760, 2805], [2760, 2635], [2225, 2635], [2225, 1925], [1895, 1925], [1895, 2635], [865, 2635], [865, 1905]]);
					}
				}
			}
			color(c = [0.5000000000, 0.5000000000, 0.5000000000]) {
				translate(v = [0, 0, 2276.1000000000]) {
					linear_extrude(height = 340.0000000000) {
						polygon(paths = [[0, 1, 2, 3]], points = [[145, -85], [145, 85], [315, 85], [315, -85]]);
					}
				}
			}
			color(c = [0.5000000000, 0.5000000000, 0.5000000000]) {
				translate(v = [0, 0, 2276.1000000000]) {
					linear_extrude(height = 340.0000000000) {
						polygon(paths = [[0, 1, 2, 3]], points = [[605, -85], [605, 85], [775, 85], [775, -85]]);
					}
				}
			}
			color(c = [0.5000000000, 0.5000000000, 0.5000000000]) {
				translate(v = [0, 0, 2276.1000000000]) {
					linear_extrude(height = 340.0000000000) {
						polygon(paths = [[0, 1, 2, 3]], points = [[1065, -85], [1065, 85], [1235, 85], [1235, -85]]);
					}
				}
			}
			color(c = [0.5000000000, 0.5000000000, 0.5000000000]) {
				translate(v = [0, 0, 2276.1000000000]) {
					linear_extrude(height = 340.0000000000) {
						polygon(paths = [[0, 1, 2, 3]], points = [[1525, -85], [1525, 85], [1695, 85], [1695, -85]]);
					}
				}
			}
			color(c = [0.5000000000, 0.5000000000, 0.5000000000]) {
				translate(v = [0, 0, 2276.1000000000]) {
					linear_extrude(height = 340.0000000000) {
						polygon(paths = [[0, 1, 2, 3]], points = [[1985, -85], [1985, 85], [2155, 85], [2155, -85]]);
					}
				}
			}
			color(c = [0.5000000000, 0.5000000000, 0.5000000000]) {
				translate(v = [0, 0, 2276.1000000000]) {
					linear_extrude(height = 340.0000000000) {
						polygon(paths = [[0, 1, 2, 3]], points = [[2445, -85], [2445, 85], [2615, 85], [2615, -85]]);
					}
				}
			}
			color(c = [0.5000000000, 0.5000000000, 0.5000000000]) {
				translate(v = [0, 0, 2276.1000000000]) {
					linear_extrude(height = 340.0000000000) {
						polygon(paths = [[0, 1, 2, 3]], points = [[145, 2635], [145, 2805], [315, 2805], [315, 2635]]);
					}
				}
			}
			color(c = [0.5000000000, 0.5000000000, 0.5000000000]) {
				translate(v = [0, 0, 2276.1000000000]) {
					linear_extrude(height = 340.0000000000) {
						polygon(paths = [[0, 1, 2, 3]], points = [[605, 2635], [605, 2805], [775, 2805], [775, 2635]]);
					}
				}
			}
			color(c = [0.5000000000, 0.5000000000, 0.5000000000]) {
				translate(v = [0, 0, 2276.1000000000]) {
					linear_extrude(height = 340.0000000000) {
						polygon(paths = [[0, 1, 2, 3]], points = [[1065, 2635], [1065, 2805], [1235, 2805], [1235, 2635]]);
					}
				}
			}
			color(c = [0.5000000000, 0.5000000000, 0.5000000000]) {
				translate(v = [0, 0, 2276.1000000000]) {
					linear_extrude(height = 340.0000000000) {
						polygon(paths = [[0, 1, 2, 3]], points = [[1525, 2635], [1525, 2805], [1695, 2805], [1695, 2635]]);
					}
				}
			}
			color(c = [0.5000000000, 0.5000000000, 0.5000000000]) {
				translate(v = [0, 0, 2276.1000000000]) {
					linear_extrude(height = 340.0000000000) {
						polygon(paths = [[0, 1, 2, 3]], points = [[1985, 2635], [1985, 2805], [2155, 2805], [2155, 2635]]);
					}
				}
			}
			color(c = [0.5000000000, 0.5000000000, 0.5000000000]) {
				translate(v = [0, 0, 2276.1000000000]) {
					linear_extrude(height = 340.0000000000) {
						polygon(paths = [[0, 1, 2, 3]], points = [[2445, 2635], [2445, 2805], [2615, 2805], [2615, 2635]]);
					}
				}
			}
			color(c = [0.3000000000, 0.3000000000, 1]) {
				translate(v = [0, 0, 2616.1000000000]) {
					linear_extrude(height = 360.0000000000) {
						polygon(paths = [[0, 1, 2, 3]], points = [[0, -240], [0, 240], [2760, 240], [2760, -240]]);
					}
				}
			}
			color(c = [0.3000000000, 0.3000000000, 1]) {
				translate(v = [0, 0, 2616.1000000000]) {
					linear_extrude(height = 360.0000000000) {
						polygon(paths = [[0, 1, 2, 3]], points = [[0, 2480], [0, 2960], [2760, 2960], [2760, 2480]]);
					}
				}
			}
		}
	}
}
